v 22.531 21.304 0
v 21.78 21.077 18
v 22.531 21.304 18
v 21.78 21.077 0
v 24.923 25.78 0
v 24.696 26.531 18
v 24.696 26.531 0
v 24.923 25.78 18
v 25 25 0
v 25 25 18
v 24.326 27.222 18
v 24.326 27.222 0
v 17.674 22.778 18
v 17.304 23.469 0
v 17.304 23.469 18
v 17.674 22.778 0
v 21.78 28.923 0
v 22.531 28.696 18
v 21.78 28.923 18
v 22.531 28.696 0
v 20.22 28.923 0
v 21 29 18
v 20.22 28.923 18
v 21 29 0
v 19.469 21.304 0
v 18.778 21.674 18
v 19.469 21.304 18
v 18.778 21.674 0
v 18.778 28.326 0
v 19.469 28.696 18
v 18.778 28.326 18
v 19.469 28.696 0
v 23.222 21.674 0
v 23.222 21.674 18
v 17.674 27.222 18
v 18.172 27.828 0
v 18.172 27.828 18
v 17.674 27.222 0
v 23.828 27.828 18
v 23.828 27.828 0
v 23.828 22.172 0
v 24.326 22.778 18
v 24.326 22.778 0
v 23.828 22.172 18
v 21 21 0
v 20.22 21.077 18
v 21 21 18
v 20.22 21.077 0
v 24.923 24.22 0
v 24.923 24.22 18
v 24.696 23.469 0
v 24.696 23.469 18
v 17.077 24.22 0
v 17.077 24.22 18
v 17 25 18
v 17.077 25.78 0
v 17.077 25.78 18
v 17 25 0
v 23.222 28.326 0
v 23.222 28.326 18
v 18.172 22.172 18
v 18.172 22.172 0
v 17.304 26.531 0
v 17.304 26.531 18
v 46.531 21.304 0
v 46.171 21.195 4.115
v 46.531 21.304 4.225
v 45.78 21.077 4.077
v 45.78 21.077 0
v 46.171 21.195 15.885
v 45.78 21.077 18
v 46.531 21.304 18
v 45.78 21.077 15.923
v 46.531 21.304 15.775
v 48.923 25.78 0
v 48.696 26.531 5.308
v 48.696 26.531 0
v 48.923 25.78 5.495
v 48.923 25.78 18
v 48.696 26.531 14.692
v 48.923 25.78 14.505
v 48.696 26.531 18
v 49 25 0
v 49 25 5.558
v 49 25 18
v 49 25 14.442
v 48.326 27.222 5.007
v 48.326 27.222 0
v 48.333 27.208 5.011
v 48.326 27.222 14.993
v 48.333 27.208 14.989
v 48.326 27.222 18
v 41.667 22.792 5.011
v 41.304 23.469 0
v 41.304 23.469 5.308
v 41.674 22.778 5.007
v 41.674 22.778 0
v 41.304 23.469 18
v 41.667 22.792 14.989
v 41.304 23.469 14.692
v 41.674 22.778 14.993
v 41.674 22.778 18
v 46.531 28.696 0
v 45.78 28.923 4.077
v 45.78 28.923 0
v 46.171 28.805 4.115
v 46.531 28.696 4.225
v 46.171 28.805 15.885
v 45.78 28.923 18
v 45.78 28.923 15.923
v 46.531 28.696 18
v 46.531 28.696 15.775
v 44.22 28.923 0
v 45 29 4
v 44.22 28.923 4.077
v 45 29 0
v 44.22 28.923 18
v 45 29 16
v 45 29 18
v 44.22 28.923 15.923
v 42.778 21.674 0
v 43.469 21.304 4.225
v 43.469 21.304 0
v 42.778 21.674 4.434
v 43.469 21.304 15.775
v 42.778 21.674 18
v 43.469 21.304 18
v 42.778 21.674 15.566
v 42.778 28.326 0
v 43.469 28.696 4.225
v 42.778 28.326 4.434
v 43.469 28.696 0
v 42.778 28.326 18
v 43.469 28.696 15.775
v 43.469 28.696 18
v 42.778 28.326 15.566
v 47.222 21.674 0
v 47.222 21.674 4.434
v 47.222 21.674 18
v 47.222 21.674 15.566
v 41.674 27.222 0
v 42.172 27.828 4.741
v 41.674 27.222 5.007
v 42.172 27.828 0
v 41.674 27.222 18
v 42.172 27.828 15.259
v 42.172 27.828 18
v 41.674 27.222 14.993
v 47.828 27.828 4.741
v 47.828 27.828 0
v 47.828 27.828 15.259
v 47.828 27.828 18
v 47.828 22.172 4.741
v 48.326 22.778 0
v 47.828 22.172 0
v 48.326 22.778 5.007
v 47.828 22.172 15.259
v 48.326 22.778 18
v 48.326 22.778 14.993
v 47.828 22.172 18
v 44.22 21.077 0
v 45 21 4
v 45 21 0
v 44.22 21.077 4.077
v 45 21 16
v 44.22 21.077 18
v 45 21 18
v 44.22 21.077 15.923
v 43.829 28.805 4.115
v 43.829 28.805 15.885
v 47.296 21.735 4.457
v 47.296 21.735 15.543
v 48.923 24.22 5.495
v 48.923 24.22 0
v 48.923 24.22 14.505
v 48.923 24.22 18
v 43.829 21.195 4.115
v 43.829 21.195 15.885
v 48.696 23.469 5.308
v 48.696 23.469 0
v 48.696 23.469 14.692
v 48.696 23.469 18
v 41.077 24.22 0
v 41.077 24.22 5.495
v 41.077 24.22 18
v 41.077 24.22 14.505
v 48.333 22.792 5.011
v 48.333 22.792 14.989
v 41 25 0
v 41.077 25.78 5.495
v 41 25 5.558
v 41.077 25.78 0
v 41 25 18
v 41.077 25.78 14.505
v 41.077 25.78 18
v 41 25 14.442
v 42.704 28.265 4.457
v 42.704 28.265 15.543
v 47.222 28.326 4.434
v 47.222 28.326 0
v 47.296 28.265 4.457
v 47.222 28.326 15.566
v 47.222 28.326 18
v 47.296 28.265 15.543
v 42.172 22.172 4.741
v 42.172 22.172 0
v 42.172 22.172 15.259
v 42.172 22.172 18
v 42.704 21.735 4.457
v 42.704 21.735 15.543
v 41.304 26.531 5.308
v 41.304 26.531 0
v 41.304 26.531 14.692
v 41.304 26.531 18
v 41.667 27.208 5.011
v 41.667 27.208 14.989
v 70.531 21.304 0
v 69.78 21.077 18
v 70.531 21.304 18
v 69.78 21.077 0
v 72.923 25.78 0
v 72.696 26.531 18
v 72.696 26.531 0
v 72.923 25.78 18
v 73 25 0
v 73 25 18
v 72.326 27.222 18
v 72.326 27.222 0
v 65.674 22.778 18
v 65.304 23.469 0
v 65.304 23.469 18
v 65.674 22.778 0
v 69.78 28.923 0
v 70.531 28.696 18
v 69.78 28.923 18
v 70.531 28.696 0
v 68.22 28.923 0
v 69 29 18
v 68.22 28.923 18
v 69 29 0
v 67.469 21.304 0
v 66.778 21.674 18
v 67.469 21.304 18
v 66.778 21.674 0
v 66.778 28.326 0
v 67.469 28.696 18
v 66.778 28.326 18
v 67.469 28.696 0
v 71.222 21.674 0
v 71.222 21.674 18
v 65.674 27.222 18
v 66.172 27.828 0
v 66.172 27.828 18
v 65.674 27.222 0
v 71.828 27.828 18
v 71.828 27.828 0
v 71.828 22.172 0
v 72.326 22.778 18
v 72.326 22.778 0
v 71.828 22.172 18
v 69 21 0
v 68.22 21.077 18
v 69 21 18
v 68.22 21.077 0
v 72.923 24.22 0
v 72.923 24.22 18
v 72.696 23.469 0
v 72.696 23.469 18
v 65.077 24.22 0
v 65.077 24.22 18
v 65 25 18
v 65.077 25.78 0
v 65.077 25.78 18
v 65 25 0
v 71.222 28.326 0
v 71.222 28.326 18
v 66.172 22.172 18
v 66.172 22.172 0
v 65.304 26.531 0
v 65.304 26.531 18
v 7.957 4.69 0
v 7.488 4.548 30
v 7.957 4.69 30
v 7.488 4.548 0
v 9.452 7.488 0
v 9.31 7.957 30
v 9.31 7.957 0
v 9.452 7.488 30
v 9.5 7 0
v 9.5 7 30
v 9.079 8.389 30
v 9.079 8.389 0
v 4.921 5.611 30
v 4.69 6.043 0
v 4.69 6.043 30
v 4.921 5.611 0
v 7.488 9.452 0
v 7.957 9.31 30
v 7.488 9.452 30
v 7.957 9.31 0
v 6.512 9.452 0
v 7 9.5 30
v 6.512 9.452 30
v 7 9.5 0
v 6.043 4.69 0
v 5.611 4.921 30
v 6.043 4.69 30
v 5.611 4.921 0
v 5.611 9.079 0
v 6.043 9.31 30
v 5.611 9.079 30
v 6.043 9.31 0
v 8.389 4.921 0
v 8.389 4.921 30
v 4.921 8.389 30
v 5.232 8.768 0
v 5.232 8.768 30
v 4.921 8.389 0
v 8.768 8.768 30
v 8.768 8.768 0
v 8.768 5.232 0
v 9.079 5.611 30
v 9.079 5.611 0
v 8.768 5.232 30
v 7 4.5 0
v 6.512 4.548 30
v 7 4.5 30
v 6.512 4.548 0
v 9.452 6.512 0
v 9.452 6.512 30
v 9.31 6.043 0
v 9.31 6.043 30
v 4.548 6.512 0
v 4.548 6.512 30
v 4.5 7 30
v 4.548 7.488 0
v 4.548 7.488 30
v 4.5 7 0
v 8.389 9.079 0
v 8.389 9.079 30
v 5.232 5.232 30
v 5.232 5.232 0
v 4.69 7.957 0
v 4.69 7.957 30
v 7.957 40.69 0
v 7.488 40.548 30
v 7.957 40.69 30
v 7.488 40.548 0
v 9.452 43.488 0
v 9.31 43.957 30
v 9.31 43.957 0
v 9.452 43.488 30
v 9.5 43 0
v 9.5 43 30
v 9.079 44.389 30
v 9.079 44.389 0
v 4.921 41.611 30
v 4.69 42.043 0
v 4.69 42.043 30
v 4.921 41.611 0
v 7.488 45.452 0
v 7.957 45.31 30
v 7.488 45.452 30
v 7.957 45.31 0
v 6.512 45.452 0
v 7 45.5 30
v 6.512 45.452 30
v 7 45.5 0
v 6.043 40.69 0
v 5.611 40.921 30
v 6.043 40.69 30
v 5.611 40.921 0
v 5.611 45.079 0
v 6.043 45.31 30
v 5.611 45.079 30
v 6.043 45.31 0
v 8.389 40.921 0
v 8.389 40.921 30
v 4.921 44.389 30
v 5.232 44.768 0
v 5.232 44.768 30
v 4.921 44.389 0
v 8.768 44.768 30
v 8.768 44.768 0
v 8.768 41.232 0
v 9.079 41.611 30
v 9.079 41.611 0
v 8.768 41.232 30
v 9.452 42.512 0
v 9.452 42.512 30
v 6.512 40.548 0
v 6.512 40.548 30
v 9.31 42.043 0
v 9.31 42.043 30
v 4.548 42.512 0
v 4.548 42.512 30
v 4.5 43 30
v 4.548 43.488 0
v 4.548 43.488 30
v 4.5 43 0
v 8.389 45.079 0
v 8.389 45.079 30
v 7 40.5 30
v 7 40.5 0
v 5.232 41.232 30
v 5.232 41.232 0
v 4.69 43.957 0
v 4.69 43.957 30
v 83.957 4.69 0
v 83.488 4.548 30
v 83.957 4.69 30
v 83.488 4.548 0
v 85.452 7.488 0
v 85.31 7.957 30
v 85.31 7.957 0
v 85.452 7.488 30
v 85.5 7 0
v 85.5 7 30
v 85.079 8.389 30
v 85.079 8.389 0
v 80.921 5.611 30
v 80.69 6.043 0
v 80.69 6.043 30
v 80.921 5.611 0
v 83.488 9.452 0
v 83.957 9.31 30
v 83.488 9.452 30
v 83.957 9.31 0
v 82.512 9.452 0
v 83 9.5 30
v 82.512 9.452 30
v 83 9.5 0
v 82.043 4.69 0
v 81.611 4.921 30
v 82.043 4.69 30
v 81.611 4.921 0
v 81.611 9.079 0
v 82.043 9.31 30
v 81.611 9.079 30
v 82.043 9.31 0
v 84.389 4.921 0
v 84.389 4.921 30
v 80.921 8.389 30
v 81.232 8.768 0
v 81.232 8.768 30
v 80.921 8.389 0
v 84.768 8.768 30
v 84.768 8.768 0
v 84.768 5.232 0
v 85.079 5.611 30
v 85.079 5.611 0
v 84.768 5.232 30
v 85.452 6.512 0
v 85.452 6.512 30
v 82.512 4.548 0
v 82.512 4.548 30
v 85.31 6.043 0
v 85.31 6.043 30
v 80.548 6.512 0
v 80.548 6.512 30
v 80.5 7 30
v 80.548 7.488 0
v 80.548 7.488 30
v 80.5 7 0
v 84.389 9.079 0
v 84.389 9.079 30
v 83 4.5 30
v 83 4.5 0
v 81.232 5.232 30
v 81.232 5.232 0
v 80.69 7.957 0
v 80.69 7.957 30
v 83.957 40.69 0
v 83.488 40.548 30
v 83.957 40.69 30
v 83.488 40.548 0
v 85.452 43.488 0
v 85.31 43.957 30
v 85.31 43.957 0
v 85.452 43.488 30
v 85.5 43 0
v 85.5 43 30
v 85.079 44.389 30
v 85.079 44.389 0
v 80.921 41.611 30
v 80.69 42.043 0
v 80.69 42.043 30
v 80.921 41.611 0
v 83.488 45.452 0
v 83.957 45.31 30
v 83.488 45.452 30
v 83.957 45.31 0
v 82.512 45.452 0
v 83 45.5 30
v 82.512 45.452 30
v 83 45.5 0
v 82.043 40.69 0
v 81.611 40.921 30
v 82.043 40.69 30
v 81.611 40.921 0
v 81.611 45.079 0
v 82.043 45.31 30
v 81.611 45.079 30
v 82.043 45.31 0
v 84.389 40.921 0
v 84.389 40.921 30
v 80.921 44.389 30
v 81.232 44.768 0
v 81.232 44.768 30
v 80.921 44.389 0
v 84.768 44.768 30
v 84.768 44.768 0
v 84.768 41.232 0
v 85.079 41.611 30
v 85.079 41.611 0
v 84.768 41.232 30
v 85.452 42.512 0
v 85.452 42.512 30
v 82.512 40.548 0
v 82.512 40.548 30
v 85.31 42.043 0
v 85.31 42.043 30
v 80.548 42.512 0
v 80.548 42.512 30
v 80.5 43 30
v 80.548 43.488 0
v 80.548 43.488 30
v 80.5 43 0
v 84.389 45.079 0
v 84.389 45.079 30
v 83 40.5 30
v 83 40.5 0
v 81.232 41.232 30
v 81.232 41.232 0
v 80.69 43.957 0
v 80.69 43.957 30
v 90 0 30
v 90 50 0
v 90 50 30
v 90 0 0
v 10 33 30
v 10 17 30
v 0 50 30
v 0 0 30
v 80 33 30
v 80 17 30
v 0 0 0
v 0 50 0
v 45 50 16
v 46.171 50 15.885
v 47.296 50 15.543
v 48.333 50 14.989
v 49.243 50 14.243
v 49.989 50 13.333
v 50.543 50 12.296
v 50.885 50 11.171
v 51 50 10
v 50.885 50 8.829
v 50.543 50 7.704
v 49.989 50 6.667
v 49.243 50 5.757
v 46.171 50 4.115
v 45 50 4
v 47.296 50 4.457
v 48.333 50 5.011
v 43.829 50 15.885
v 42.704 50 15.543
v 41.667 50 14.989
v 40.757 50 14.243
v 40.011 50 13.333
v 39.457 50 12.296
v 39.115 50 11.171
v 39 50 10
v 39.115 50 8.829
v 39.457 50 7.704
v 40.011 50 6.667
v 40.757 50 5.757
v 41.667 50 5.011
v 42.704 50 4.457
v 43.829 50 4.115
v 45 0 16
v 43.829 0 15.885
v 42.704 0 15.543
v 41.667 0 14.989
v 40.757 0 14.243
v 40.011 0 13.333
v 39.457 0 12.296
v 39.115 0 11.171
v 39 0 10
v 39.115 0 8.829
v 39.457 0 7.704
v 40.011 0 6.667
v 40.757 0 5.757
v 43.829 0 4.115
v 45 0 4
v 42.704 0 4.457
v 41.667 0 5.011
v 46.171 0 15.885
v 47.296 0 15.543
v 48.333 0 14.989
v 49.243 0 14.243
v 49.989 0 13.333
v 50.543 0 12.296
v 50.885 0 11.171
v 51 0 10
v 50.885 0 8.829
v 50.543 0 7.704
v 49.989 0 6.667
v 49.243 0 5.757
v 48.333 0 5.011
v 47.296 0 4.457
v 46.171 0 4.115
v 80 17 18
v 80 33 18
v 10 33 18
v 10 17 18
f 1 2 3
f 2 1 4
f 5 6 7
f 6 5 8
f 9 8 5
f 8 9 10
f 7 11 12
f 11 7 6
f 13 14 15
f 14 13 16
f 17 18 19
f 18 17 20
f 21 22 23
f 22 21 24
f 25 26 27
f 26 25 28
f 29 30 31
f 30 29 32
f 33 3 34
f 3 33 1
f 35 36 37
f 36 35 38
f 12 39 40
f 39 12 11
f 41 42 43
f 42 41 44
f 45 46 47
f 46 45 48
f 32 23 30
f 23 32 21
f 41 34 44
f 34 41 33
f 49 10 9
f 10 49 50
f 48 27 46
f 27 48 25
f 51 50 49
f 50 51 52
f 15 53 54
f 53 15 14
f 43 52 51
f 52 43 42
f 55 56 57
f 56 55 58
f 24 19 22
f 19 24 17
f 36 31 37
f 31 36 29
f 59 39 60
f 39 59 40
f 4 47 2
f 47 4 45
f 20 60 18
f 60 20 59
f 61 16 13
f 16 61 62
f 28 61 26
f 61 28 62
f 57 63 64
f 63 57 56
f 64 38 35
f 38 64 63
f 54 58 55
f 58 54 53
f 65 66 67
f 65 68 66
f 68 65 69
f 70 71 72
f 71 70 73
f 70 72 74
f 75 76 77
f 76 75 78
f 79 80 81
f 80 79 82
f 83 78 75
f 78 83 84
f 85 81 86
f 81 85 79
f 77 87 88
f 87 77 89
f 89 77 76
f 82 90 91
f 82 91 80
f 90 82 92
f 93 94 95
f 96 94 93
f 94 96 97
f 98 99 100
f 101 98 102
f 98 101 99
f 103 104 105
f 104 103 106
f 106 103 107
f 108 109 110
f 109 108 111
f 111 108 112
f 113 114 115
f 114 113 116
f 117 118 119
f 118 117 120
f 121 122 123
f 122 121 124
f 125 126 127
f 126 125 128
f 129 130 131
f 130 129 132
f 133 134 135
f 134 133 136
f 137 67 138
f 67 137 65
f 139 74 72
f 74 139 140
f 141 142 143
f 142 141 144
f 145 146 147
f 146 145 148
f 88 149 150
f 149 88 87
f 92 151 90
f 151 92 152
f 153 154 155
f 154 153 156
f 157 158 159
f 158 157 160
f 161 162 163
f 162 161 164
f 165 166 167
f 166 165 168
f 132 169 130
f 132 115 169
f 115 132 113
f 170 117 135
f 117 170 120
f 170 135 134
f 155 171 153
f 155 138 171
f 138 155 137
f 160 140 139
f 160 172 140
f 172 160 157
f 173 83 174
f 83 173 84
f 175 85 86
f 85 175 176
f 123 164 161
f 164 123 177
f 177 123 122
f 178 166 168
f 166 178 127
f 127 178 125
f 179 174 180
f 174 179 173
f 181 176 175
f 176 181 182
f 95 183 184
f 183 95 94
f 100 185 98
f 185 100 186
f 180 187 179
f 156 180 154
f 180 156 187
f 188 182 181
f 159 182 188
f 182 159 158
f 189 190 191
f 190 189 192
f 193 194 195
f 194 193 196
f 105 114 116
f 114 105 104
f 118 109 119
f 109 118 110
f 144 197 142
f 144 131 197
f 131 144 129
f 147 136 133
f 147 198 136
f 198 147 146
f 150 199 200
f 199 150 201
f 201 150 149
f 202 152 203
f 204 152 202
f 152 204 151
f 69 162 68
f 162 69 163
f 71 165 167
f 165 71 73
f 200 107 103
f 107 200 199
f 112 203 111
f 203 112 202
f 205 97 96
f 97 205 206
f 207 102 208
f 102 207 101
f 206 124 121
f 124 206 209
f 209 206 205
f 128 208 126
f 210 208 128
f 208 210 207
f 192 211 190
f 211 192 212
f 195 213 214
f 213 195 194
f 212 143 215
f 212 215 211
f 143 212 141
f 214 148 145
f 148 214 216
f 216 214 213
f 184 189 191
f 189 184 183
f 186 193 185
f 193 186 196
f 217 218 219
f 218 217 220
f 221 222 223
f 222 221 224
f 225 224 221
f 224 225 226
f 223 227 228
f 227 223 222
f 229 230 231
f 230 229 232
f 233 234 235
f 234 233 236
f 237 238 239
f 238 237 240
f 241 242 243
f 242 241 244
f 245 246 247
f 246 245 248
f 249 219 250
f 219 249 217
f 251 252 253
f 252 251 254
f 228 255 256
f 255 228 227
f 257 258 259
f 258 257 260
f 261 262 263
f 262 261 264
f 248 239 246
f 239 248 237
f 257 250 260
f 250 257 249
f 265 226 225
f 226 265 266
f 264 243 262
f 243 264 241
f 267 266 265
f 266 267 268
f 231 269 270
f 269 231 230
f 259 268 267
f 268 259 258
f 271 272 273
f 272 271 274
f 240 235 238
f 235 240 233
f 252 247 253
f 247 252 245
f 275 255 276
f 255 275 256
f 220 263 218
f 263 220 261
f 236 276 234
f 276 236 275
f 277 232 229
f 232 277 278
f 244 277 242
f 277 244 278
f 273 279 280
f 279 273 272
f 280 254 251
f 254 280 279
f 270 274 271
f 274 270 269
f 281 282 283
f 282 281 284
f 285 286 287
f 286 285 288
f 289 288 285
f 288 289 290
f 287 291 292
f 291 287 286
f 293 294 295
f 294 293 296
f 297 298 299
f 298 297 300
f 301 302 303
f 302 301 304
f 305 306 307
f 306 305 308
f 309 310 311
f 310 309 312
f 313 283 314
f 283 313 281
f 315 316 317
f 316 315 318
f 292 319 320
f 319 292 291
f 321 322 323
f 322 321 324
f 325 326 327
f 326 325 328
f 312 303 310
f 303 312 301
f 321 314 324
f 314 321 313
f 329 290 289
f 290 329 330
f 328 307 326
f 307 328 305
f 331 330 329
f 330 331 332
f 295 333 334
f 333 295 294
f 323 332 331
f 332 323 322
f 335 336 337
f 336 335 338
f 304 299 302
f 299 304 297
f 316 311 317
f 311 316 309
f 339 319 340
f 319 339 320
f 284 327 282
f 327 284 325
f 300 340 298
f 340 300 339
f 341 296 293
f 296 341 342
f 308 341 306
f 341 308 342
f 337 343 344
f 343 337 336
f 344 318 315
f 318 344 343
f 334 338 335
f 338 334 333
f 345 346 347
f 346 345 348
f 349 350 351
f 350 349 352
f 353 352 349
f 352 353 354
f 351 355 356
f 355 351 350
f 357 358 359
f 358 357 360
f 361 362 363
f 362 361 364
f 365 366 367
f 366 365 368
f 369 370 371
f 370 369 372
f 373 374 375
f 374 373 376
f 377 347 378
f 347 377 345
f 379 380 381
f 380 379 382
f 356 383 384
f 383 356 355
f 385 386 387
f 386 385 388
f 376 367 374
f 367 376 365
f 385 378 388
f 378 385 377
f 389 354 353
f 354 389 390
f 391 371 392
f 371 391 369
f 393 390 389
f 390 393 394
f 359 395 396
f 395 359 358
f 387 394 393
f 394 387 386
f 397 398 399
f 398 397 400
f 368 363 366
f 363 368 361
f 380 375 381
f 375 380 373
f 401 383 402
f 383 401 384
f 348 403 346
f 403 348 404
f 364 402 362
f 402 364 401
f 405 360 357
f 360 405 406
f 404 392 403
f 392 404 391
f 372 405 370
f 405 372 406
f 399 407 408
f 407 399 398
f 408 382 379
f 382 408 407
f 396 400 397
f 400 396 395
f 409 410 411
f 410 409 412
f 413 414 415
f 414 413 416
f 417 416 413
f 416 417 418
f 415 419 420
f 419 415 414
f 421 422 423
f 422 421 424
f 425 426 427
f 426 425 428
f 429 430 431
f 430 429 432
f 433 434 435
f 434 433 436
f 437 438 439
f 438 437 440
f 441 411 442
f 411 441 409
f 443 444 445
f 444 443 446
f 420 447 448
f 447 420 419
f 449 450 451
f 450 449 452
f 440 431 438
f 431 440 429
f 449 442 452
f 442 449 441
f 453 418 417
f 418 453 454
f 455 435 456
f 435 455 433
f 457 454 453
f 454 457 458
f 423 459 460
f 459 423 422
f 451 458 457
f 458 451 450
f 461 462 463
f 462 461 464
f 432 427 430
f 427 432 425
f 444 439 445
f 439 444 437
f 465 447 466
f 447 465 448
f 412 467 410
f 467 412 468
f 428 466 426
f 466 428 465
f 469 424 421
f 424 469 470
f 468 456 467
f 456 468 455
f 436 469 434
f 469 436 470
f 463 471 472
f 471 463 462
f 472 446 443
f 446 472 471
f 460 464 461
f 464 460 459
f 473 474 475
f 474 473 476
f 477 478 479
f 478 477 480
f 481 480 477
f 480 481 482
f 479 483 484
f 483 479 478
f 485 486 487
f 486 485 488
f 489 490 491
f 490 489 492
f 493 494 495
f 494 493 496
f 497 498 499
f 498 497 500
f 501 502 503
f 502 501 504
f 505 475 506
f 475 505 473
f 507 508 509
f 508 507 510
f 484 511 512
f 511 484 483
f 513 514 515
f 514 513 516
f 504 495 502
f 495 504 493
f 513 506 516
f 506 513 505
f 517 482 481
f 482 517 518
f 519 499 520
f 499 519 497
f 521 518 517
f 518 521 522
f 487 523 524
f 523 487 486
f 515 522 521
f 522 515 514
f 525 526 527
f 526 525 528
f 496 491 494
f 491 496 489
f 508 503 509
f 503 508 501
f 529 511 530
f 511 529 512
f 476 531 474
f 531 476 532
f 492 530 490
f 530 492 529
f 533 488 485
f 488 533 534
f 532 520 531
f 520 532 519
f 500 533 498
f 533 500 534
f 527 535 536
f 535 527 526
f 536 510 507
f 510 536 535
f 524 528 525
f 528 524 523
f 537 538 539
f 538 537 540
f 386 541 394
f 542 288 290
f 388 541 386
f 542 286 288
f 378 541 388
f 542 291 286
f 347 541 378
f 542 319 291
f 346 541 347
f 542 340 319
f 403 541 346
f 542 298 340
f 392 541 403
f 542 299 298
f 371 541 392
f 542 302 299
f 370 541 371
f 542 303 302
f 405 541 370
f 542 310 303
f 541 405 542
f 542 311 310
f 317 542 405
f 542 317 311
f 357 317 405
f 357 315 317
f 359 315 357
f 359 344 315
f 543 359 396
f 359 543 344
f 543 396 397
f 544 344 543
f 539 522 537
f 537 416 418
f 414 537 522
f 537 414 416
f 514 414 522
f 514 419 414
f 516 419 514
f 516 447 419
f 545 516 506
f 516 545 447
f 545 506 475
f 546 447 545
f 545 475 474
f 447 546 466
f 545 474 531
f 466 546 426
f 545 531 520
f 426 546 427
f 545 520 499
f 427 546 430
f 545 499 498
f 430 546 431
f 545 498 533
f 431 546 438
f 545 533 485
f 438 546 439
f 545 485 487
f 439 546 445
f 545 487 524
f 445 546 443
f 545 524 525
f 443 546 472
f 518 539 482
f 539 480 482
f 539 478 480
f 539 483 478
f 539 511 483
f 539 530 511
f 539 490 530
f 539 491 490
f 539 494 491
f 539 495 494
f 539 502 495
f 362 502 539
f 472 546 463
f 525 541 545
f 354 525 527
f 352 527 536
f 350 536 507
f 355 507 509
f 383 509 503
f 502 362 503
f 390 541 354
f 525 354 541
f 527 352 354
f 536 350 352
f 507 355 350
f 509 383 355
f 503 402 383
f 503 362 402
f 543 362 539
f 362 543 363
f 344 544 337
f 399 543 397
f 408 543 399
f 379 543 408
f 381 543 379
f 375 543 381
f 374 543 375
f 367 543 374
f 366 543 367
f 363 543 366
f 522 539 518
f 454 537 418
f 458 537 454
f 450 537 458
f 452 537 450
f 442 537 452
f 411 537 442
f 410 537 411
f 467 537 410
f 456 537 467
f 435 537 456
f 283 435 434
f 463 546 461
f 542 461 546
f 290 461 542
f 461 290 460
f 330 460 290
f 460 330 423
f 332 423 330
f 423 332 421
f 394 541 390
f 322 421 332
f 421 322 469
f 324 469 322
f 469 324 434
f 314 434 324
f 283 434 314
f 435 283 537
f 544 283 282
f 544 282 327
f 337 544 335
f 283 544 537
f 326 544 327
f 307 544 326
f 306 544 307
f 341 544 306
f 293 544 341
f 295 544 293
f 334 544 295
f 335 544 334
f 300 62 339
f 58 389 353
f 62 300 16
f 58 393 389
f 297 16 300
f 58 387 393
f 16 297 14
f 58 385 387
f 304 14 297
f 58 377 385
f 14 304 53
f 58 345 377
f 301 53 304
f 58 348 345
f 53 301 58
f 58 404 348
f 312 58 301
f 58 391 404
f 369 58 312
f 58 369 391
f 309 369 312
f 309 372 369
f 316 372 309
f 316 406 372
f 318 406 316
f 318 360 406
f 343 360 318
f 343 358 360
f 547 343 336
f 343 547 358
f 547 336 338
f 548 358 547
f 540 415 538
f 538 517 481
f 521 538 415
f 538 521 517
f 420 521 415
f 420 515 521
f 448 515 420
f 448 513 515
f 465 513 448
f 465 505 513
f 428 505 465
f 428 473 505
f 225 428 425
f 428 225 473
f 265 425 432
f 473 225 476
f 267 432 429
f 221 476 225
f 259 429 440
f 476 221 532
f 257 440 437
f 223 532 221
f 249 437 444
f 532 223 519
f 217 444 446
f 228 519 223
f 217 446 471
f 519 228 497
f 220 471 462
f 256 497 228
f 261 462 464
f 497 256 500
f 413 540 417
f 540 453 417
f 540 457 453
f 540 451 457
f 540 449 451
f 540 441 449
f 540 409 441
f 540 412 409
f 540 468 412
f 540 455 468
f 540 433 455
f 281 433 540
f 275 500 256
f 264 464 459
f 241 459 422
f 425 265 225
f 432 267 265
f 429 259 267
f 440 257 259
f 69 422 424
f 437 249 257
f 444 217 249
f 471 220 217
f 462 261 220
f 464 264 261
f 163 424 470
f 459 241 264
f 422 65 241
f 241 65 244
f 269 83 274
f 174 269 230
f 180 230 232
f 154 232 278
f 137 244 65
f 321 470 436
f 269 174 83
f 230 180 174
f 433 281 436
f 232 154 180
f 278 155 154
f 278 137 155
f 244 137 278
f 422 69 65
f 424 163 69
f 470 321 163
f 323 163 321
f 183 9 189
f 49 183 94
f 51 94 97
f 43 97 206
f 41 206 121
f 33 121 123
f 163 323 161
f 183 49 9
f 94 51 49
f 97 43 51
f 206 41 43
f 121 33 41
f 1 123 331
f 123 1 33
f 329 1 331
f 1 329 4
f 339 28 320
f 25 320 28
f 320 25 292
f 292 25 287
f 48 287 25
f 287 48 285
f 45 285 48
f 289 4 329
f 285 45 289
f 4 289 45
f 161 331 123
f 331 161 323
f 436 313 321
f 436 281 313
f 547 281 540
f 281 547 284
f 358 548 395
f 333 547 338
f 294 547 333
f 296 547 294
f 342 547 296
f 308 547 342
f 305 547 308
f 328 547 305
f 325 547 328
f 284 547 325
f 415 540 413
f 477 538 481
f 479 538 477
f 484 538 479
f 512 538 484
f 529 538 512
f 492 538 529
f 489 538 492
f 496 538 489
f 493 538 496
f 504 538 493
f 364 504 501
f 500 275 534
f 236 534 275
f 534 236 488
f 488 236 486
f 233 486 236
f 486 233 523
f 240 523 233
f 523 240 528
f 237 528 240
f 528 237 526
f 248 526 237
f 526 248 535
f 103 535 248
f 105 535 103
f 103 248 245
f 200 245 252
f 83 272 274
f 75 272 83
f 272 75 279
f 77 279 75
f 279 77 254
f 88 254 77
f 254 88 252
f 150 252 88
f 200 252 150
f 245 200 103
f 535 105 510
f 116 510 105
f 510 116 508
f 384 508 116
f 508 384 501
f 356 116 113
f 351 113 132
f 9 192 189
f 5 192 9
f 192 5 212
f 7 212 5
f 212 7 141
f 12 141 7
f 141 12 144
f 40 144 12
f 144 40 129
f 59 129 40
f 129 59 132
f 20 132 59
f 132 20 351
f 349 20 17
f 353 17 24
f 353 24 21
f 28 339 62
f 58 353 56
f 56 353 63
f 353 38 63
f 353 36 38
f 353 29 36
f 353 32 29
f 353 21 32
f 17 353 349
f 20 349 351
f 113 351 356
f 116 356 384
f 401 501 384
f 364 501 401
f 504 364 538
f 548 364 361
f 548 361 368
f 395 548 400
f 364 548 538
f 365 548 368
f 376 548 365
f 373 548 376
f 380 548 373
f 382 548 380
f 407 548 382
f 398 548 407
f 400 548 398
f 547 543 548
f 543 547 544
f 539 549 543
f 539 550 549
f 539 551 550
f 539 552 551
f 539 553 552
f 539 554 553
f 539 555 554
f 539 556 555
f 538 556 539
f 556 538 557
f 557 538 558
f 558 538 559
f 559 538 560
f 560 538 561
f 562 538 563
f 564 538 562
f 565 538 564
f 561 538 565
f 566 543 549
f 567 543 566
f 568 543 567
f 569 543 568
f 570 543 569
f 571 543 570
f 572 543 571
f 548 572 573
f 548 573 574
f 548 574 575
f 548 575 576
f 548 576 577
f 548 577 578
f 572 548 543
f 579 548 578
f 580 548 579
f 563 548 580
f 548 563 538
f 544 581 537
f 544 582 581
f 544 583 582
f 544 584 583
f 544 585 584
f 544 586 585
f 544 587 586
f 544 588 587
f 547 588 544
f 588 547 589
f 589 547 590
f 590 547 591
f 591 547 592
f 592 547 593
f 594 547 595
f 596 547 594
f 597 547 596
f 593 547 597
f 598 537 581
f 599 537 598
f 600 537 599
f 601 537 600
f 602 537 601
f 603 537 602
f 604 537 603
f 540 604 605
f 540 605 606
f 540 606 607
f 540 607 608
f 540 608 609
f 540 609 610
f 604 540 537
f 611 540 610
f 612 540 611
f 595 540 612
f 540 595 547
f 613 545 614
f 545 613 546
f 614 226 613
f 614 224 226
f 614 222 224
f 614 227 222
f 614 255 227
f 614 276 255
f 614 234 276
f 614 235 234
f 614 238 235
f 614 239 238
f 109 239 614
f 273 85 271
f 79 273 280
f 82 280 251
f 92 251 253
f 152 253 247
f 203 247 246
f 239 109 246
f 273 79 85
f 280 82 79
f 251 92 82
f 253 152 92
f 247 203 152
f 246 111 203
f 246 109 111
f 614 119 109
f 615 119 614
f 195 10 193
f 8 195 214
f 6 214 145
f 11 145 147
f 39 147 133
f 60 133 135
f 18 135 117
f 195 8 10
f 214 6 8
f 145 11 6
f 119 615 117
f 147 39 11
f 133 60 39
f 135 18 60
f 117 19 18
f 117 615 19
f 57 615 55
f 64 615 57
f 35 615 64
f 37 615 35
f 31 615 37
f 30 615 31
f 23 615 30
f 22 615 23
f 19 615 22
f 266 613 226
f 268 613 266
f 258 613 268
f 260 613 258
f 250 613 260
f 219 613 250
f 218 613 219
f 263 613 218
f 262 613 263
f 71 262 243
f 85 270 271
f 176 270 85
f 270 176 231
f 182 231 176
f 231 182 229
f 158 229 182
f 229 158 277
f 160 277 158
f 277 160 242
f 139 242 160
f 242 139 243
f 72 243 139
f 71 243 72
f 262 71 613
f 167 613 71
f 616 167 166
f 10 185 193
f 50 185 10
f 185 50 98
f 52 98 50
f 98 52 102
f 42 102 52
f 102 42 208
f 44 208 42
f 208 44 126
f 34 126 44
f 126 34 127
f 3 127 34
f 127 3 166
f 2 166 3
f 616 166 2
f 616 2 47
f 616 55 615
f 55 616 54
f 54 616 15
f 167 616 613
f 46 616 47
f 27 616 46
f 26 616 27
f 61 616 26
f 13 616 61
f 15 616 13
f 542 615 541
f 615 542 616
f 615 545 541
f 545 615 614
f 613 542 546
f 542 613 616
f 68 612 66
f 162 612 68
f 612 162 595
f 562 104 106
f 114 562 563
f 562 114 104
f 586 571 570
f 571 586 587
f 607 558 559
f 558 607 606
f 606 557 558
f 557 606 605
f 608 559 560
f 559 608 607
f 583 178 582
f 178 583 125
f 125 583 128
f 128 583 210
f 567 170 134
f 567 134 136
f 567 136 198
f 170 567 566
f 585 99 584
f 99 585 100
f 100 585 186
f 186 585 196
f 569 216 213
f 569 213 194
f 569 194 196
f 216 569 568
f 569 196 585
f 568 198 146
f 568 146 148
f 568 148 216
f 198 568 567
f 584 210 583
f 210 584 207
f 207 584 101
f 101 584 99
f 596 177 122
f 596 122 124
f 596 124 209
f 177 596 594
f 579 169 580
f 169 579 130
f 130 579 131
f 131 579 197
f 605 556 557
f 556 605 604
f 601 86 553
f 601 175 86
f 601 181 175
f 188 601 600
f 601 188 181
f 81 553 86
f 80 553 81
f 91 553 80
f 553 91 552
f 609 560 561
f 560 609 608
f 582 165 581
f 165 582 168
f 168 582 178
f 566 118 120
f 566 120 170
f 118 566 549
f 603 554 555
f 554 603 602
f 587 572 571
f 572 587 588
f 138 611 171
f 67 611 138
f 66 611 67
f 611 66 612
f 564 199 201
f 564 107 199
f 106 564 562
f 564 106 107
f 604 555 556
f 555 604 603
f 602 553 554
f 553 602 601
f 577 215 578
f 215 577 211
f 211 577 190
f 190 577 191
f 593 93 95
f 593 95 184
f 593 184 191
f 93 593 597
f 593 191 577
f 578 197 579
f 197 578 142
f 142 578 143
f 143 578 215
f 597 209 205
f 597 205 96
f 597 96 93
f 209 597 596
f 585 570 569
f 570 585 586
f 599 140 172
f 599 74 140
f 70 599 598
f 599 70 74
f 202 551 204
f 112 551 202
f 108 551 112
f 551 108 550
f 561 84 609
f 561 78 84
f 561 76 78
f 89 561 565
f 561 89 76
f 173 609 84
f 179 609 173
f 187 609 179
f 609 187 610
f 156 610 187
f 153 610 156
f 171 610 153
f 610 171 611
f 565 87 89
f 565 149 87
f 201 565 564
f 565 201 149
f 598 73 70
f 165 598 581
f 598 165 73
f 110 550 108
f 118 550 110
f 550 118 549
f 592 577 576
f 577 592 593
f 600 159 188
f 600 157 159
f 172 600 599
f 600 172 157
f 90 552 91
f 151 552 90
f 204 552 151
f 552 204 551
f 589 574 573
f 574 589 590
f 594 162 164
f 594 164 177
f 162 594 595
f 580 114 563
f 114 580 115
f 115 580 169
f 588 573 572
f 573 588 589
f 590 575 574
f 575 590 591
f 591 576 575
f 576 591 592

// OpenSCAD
$fn = 32;

// ----------------------------------------------------------------------
// Manifold block: side_outlet manifold
// ----------------------------------------------------------------------

// --- parameters (mm) ---
block_l = 90;             // block length, X
block_w = 50;             // block width, Y
block_h = 30;             // block height, Z
port_d = 8;               // port bore diameter
port_pitch = 24;          // port pitch along X
gallery_d = 16;           // top gallery width, Y
gallery_depth = 12;       // gallery pocket depth
wall_p = 10;              // gallery end wall thickness, X
mnt_d = 5;                // mounting hole diameter
mnt_in = 7;               // mounting hole inset from the edges
out_d = 12;               // outlet bore diameter
out_z = 10;               // outlet axis height

n_ports = 3;  // ports in the row
port_x0 = (block_l - (n_ports - 1) * port_pitch) / 2;  // first port X

difference() {
  cube([block_l, block_w, block_h]);
  for (i = [0 : n_ports - 1])
    translate([port_x0 + i * port_pitch, block_w / 2, -1])
      cylinder(h = block_h + 2, d = port_d);
  translate([wall_p, block_w / 2 - gallery_d / 2, block_h - gallery_depth])
    cube([block_l - 2 * wall_p, gallery_d, gallery_depth + 1]);
  for (cx = [mnt_in, block_l - mnt_in])
    for (cy = [mnt_in, block_w - mnt_in])
      translate([cx, cy, -1]) cylinder(h = block_h + 2, d = mnt_d);
  translate([block_l / 2, -1, out_z]) rotate([-90, 0, 0])
    cylinder(h = block_w + 2, d = out_d);
}
